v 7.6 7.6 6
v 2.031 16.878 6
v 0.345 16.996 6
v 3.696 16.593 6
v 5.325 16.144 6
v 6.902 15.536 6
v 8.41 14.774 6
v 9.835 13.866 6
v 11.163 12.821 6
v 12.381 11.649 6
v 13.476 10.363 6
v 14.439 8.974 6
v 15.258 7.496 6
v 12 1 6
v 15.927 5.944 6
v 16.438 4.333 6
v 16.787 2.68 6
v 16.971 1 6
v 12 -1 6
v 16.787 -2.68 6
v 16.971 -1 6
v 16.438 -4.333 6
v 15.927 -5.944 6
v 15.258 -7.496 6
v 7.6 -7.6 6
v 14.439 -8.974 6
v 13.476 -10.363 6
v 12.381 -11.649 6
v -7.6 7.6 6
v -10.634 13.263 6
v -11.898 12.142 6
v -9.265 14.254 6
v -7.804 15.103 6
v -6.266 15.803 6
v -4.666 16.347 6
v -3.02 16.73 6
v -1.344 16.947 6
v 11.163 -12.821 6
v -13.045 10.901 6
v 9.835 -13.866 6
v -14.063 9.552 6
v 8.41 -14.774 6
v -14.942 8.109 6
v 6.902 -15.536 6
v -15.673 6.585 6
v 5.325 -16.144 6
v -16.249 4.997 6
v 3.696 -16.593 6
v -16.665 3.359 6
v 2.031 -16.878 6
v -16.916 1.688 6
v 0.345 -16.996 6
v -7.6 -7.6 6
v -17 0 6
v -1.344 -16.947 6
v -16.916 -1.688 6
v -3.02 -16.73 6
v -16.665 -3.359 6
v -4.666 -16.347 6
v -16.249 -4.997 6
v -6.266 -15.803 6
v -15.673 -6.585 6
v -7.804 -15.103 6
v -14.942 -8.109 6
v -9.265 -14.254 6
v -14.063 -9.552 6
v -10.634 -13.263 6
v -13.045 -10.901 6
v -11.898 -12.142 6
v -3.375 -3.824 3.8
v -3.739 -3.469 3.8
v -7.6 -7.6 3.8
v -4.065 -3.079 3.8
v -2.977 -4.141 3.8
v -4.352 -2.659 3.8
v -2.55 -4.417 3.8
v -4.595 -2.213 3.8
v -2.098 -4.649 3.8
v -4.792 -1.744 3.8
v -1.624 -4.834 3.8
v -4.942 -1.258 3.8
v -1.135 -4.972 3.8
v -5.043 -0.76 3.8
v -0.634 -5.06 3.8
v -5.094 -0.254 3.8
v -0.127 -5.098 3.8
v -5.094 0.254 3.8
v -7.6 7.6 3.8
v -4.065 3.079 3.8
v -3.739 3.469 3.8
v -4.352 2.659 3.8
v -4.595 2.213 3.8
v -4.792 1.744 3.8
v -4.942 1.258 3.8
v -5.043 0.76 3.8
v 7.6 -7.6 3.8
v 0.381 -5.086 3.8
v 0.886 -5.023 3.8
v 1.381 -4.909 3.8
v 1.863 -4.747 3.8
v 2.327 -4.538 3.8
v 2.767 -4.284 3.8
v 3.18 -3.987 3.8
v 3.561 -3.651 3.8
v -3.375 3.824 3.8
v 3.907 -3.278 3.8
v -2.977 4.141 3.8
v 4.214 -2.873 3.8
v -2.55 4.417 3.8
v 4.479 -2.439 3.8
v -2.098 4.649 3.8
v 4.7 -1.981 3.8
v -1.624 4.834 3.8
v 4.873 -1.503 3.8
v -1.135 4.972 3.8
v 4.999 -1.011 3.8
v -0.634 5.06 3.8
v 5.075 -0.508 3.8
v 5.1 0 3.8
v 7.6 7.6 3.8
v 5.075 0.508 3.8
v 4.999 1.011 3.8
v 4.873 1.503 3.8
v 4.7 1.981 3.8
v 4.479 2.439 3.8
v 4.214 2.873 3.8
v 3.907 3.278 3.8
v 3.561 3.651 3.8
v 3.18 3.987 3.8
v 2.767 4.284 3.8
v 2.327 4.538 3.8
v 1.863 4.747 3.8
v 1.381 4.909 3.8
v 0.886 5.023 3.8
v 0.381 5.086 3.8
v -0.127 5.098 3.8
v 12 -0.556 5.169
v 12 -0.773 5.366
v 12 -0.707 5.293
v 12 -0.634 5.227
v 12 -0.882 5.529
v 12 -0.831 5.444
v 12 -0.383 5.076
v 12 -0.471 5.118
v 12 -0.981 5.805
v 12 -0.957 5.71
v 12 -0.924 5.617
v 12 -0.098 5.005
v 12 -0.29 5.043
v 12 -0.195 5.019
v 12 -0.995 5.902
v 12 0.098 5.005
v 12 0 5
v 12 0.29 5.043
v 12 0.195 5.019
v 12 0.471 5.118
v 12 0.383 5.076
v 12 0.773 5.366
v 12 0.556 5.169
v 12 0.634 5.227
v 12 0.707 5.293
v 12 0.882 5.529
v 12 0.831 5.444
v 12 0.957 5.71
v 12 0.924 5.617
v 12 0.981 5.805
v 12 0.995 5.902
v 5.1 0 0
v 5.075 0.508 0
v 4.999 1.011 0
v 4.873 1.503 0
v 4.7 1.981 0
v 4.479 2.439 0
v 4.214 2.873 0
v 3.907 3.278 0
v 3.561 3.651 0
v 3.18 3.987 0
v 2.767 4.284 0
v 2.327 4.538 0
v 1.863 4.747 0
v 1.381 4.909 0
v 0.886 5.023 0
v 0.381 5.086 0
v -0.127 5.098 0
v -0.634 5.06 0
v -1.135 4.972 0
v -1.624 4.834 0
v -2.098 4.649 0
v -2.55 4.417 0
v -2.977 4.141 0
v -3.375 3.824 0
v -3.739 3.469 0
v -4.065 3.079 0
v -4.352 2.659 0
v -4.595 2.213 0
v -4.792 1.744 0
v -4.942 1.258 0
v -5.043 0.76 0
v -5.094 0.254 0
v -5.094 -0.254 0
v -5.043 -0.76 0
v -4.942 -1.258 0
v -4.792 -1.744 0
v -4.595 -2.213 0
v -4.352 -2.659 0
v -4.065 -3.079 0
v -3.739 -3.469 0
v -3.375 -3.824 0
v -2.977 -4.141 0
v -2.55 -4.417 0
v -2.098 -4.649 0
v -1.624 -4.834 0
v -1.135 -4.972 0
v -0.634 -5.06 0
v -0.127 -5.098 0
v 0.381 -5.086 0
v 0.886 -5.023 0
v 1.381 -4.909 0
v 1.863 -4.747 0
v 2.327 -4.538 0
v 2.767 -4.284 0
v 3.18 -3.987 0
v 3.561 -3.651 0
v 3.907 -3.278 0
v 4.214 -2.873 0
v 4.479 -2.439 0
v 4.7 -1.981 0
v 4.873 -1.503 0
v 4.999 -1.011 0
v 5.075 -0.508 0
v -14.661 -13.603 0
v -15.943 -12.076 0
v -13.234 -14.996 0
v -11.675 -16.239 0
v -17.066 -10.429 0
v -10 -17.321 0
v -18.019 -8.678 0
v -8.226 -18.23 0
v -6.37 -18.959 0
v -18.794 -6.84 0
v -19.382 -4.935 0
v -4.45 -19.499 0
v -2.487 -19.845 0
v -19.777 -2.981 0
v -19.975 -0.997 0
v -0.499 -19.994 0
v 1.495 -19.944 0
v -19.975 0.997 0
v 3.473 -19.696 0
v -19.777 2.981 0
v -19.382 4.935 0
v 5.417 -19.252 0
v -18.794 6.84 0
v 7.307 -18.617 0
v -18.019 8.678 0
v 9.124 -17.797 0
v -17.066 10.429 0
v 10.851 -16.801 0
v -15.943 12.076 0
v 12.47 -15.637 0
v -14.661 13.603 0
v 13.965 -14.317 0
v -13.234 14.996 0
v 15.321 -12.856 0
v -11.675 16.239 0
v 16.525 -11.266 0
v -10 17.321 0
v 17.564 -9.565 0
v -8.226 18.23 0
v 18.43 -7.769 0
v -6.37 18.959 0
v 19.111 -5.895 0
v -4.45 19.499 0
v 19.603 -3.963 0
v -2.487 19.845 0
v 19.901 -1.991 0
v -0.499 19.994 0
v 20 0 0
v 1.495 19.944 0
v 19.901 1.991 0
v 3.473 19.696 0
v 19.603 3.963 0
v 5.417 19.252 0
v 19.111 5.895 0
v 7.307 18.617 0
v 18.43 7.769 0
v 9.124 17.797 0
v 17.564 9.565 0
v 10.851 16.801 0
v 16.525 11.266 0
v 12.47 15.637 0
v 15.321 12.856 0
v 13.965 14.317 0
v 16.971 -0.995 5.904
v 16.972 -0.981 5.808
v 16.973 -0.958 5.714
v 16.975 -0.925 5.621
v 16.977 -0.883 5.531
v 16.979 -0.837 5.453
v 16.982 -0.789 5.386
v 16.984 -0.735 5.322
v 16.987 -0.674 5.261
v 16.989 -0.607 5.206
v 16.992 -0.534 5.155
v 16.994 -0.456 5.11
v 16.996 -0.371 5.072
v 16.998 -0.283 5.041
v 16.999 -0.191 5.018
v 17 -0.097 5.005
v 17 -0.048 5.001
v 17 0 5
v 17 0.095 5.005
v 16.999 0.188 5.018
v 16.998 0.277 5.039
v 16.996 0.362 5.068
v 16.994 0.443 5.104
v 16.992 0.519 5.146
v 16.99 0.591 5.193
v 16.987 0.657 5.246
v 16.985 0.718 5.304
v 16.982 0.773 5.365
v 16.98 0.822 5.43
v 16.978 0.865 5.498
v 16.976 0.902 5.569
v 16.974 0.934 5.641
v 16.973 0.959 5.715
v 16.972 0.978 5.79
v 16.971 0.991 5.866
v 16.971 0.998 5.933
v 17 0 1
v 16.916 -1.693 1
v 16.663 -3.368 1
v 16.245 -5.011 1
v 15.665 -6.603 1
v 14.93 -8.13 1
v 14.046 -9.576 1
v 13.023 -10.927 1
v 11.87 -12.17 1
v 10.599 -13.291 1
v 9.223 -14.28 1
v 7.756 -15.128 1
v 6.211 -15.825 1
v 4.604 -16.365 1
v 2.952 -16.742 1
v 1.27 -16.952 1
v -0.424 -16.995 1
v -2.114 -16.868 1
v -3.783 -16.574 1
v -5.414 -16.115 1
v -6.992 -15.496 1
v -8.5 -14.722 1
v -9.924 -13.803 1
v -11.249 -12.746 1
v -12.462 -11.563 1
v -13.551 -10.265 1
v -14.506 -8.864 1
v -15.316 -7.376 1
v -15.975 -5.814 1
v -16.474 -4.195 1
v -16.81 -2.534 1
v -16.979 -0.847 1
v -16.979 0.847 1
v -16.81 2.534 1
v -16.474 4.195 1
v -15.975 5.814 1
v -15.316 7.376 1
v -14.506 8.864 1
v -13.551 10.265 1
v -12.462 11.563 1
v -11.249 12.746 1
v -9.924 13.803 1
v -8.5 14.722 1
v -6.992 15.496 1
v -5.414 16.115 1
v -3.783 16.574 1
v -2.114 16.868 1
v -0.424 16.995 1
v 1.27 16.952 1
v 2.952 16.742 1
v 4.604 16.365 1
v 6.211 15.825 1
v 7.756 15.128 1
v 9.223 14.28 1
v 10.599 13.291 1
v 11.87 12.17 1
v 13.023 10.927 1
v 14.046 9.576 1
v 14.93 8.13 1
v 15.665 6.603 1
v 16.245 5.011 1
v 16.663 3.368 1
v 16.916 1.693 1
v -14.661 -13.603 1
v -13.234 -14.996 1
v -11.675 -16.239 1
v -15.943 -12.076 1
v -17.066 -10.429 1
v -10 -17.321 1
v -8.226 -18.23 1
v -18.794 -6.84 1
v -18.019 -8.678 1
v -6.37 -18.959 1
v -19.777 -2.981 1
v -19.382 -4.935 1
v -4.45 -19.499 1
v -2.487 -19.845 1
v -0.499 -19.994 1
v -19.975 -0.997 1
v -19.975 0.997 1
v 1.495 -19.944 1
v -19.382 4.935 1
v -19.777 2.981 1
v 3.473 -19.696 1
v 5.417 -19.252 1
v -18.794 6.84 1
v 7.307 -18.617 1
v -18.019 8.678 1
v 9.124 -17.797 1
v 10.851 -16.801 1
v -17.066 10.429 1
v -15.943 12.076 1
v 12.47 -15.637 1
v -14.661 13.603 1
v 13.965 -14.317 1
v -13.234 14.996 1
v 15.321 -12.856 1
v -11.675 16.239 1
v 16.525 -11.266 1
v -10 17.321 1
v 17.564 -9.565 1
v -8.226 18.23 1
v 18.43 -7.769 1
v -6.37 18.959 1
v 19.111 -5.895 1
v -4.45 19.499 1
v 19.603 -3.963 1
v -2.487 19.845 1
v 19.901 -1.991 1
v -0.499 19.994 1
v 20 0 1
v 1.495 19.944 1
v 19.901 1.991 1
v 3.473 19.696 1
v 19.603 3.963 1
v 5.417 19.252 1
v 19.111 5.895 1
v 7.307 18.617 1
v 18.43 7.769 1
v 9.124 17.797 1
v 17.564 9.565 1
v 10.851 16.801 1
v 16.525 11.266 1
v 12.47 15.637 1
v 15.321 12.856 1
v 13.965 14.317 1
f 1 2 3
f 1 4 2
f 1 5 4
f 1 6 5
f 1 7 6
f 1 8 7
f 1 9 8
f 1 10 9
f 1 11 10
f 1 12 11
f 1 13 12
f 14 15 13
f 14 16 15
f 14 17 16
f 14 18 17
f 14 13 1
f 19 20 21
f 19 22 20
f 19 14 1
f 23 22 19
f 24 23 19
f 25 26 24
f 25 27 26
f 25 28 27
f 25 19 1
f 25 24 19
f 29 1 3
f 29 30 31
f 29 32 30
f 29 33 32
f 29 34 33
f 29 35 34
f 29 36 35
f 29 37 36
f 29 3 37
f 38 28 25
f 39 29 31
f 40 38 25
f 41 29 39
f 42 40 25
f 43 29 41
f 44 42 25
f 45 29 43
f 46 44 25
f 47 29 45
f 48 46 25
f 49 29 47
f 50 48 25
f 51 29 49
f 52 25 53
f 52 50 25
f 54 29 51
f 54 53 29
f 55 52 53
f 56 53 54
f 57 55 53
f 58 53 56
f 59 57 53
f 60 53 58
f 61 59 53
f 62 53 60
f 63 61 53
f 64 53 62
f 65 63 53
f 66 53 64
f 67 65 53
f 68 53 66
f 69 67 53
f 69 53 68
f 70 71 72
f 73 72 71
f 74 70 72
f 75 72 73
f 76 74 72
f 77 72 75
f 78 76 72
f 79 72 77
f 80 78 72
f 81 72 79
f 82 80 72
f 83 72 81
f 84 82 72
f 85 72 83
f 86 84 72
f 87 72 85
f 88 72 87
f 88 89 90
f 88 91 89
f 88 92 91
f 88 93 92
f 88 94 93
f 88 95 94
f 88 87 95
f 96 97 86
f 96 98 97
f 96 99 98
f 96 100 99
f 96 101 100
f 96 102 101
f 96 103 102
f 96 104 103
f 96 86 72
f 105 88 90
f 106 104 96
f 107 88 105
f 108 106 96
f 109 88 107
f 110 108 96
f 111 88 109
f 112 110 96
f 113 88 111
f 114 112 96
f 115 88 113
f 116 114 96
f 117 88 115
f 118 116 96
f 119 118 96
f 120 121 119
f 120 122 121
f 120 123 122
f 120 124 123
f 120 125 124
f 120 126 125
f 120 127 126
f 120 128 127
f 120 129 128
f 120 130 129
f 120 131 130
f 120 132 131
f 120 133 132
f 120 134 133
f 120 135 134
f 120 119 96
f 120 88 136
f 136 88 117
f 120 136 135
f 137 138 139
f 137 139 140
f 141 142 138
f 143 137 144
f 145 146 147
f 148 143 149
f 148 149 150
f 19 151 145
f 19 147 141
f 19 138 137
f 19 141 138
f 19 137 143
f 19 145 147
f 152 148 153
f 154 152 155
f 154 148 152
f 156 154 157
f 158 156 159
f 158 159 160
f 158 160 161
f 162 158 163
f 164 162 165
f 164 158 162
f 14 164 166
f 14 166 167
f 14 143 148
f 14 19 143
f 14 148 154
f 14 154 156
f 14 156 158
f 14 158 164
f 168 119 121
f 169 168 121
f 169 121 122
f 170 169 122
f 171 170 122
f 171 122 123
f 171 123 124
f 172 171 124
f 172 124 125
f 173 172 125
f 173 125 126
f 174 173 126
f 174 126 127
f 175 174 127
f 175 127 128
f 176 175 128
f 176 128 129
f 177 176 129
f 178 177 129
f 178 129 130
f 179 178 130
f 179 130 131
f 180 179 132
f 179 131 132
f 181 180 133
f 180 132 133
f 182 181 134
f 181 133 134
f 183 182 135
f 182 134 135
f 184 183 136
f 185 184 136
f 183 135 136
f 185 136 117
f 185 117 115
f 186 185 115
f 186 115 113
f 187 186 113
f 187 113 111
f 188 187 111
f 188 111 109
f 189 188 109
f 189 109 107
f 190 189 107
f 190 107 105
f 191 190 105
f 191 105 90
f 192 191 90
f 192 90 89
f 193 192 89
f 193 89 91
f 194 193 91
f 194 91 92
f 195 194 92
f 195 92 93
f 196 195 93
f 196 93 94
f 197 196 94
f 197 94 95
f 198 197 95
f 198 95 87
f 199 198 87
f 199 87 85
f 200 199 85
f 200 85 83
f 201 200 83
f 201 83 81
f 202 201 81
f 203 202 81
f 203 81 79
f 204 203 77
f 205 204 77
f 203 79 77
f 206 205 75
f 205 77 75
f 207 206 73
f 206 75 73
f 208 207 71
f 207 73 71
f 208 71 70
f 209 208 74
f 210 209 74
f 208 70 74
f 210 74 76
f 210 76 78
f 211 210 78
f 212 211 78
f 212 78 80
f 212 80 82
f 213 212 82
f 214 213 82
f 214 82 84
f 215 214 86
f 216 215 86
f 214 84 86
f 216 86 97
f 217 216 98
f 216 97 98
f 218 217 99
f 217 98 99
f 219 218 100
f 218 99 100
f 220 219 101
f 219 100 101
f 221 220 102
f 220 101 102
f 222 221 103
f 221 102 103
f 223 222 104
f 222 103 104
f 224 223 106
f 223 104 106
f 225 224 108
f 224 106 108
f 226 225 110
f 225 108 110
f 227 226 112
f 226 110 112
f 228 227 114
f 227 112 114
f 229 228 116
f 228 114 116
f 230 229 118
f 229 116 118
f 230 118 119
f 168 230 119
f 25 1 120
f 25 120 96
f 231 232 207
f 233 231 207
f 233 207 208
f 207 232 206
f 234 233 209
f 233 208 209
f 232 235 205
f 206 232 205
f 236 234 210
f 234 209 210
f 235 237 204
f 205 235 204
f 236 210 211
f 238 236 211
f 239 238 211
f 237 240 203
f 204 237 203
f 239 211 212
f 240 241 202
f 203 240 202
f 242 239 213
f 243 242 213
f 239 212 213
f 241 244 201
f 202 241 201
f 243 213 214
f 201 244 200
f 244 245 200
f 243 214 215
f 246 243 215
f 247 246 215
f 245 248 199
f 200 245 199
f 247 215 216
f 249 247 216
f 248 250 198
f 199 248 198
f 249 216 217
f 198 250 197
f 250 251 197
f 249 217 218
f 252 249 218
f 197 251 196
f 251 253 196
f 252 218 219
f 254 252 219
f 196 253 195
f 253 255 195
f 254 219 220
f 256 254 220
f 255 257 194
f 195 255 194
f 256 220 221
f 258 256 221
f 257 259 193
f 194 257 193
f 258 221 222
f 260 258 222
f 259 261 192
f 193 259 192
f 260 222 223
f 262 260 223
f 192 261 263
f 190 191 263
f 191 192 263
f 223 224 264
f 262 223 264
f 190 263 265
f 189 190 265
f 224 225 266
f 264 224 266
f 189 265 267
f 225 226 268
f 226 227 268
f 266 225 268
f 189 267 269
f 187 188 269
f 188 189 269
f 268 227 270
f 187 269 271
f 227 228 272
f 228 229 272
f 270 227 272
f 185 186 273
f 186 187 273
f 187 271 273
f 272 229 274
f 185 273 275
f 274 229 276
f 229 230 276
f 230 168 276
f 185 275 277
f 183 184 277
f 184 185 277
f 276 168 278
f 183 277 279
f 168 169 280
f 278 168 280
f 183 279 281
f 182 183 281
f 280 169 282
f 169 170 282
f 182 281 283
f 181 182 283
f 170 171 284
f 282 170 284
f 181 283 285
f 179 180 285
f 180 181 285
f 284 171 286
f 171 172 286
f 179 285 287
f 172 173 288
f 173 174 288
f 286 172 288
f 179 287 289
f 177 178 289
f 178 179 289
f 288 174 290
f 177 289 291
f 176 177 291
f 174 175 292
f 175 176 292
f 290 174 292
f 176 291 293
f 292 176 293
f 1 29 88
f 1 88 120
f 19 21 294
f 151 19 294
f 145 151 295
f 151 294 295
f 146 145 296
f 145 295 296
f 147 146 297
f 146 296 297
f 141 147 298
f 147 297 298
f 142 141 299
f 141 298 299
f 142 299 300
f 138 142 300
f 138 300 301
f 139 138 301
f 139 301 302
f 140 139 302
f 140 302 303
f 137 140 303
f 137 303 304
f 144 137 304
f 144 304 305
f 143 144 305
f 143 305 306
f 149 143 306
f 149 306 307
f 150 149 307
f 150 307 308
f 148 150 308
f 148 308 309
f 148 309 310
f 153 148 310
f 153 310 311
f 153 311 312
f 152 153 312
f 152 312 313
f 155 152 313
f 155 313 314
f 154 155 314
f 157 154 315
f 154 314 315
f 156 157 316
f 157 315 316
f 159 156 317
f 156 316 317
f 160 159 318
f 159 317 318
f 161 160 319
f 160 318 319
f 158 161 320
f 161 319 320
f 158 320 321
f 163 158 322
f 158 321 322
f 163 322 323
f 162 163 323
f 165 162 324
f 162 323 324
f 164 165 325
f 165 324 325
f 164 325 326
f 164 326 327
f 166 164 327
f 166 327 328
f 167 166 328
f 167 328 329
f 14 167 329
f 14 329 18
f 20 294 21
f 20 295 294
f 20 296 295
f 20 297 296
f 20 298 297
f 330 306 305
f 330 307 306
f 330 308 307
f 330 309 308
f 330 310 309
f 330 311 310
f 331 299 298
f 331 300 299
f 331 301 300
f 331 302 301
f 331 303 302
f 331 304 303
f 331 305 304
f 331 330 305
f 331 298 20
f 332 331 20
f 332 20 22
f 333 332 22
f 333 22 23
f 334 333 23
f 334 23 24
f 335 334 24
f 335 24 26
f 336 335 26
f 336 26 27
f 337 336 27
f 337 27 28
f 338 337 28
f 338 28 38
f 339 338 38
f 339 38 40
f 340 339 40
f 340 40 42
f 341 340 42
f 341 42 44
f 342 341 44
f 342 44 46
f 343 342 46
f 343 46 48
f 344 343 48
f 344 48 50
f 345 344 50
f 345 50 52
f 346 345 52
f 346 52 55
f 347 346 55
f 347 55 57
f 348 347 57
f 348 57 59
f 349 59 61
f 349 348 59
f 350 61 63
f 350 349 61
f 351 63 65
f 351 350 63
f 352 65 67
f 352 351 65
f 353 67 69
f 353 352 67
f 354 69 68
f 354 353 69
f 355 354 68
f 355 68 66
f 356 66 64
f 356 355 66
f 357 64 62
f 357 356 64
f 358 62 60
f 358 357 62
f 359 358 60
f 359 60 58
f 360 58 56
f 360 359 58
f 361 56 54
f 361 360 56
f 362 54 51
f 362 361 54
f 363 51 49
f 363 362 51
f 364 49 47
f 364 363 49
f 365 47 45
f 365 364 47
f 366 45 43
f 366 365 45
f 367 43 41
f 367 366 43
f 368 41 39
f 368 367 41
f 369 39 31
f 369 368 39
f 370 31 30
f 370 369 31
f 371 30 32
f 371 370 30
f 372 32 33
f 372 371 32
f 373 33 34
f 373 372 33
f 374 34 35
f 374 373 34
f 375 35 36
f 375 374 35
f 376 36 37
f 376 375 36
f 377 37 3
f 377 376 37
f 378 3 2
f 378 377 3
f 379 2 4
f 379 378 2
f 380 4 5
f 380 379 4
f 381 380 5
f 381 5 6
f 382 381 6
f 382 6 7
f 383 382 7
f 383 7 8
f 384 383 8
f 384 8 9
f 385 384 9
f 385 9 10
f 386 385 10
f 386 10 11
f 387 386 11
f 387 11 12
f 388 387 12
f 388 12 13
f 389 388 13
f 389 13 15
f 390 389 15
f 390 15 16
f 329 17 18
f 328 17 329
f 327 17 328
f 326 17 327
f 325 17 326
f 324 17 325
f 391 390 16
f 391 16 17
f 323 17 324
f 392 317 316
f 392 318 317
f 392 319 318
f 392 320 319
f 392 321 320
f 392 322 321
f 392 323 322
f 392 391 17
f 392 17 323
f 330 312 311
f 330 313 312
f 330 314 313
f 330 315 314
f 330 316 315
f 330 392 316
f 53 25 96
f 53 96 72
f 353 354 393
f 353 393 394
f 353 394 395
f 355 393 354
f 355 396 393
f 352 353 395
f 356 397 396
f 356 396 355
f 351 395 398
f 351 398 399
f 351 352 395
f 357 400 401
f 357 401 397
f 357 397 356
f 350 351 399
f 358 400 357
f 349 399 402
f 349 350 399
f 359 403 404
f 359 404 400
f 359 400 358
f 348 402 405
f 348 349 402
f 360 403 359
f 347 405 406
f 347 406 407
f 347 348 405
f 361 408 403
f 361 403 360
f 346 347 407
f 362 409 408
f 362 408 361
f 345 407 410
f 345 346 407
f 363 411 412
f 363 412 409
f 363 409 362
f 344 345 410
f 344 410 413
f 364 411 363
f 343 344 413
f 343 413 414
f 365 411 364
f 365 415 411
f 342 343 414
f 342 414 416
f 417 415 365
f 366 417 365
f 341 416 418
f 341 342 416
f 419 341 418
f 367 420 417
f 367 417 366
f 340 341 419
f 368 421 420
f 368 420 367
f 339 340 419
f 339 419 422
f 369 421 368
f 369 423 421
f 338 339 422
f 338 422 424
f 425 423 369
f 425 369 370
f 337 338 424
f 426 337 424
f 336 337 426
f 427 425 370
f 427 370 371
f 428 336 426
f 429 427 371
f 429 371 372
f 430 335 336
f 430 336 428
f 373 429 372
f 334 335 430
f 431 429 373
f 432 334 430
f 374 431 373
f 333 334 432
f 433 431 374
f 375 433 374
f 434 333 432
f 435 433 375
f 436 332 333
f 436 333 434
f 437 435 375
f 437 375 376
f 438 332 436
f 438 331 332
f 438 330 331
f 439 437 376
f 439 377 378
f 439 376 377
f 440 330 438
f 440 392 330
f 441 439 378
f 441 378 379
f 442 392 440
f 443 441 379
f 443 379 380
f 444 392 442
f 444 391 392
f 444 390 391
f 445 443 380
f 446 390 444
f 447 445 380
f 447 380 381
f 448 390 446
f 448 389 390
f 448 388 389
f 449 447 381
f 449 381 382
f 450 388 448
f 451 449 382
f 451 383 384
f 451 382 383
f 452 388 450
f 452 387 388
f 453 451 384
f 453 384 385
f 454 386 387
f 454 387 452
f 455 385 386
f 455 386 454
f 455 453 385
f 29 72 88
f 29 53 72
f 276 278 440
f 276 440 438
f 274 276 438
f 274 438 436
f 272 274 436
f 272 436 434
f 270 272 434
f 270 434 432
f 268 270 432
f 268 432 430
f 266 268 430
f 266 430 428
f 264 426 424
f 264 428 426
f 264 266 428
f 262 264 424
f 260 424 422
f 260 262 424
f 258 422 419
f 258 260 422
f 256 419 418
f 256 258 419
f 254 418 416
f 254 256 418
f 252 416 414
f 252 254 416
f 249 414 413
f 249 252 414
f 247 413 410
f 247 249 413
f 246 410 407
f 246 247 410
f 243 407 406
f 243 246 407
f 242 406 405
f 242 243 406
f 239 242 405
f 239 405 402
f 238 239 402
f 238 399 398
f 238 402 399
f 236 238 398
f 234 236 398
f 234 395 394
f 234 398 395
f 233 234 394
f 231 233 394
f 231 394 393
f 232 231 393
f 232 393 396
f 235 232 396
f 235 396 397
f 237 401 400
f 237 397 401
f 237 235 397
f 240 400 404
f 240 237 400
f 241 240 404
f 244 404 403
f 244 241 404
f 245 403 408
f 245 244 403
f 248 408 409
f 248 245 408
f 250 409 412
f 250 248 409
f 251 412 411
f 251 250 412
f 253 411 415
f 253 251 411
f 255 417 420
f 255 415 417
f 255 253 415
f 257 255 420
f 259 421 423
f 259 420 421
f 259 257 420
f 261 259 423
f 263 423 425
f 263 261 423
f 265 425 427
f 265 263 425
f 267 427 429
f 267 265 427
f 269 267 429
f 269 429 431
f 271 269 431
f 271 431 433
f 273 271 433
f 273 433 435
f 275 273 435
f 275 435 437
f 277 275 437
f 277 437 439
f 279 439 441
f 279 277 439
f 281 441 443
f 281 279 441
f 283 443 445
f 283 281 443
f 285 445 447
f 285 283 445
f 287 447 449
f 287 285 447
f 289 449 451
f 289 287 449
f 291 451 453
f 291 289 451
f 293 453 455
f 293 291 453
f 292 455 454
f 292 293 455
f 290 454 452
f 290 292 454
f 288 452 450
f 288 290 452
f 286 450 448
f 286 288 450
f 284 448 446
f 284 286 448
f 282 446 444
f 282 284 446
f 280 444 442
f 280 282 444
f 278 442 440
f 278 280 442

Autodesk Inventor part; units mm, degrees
ref_plane "XZ Plane" through (0, 0, 0) normal (0, 1, 0) x (-1, 0, 0)
ref_plane "XY Plane" through (0, 0, 0) normal (0, 0, 1) x (1, 0, 0)
sketch "Skizze1" plane through (0, 0, 0) normal (0, 0, 1) x (1, 0, 0)
  circle A0 centre (0, 0) radius 20
  dimension "d0" = 40
extrude "Extrusion1" add sketch "Skizze1" along normal blind 1
sketch "Skizze2" plane through (0, 0, 1) normal (0, 0, 1) x (1, 0, 0)
  circle A0 centre (0, 0) radius 20 projected
  circle A1 centre (0, 0) radius 17
  dimension "d3" = 34
extrude "Extrusion2" add sketch "Skizze2" along normal blind 10 contours A1
sketch "Skizze3" plane through (0, 0, 11) normal (0, 0, 1) x (1, 0, 0)
  circle A0 centre (0, 0) radius 17 projected
  circle A1 centre (0, 0) radius 20
  dimension "d6" = 40
extrude "Extrusion3" add sketch "Skizze3" along normal blind 1 contours A0 | A1
sketch "Skizze6" plane through (0, 0, 12) normal (0, 0, 1) x (1, 0, 0)
  circle A0 centre (0, 0) radius 20 projected
  circle A1 centre (0, 0) radius 5.1
  dimension "d16" = 10.2
extrude "Extrusion6" cut sketch "Skizze6" against normal through all contours A1
sketch "Skizze7" plane through (0, 0, 0) normal (0, 1, 0) x (-1, 0, 0)
  line L0 (17, 1) -> (17, 11) projected
  line L1 (-17, 1) -> (-17, 11) projected
  line L2 (20, 0) -> (-20, 0) projected
  line L3 (20, 0) -> (20, 1) projected
  line L4 (20, 1) -> (-20, 1) projected
  line L5 (-17, 1) -> (-17, 11) projected
  line L6 (20, 0) -> (-20, 0)
  line L7 (-20, 0) -> (-20, 6)
  line L8 (-20, 6) -> (20, 6)
  line L9 (20, 6) -> (20, 0)
  line L10 (20, 12) -> (-20, 12) projected
  point P0 (0, 0)
  dimension "d19" = 6
  dimension "d20" = 12
extrude "Extrusion7" cut sketch "Skizze7" along normal through all both and the other way through all keep common part
ref_plane "Arbeitsebene2" through (17, 0, 0) normal (1, 0, 0) x (0, 1, 0)
sketch "Skizze9" plane through (17, 0, 0) normal (1, 0, 0) x (0, 1, 0)
  line L0 (17, 6) -> (-17, 6) projected
  circle A0 centre (0, 6) radius 1
  point P0 (0, 0)
  point P1 (-1, 6)
  point P2 (1, 6)
  dimension "d24" = 2
extrude "Extrusion8" cut sketch "Skizze9" against normal blind 5 contours A0 L0 picked at (0.0402, 5.6691)
sketch "Skizze10" plane through (12, 1, 6) normal (0, 0, 1) x (1, 0, 0)
  circle A0 centre (-12, -1) radius 5.1 projected
  line L0 (-19.6, 6.6) -> (-4.4, 6.6)
  line L1 (-4.4, 6.6) -> (-4.4, -8.6)
  line L2 (-4.4, -8.6) -> (-19.6, -8.6)
  line L3 (-19.6, -8.6) -> (-19.6, 6.6)
  line L4 (-19.6, 6.6) -> (-4.4, -8.6) construction
  line L5 (-4.4, 6.6) -> (-19.6, -8.6) construction
  dimension "d27" = 15.2
  dimension "d28" = 15.2
extrude "Extrusion9" cut sketch "Skizze10" against normal blind 2.2
equation "\"d19\" = 0.5 * d20"
equation "\"d28\" = d27"
properties part number "Motorstange_version2b"
